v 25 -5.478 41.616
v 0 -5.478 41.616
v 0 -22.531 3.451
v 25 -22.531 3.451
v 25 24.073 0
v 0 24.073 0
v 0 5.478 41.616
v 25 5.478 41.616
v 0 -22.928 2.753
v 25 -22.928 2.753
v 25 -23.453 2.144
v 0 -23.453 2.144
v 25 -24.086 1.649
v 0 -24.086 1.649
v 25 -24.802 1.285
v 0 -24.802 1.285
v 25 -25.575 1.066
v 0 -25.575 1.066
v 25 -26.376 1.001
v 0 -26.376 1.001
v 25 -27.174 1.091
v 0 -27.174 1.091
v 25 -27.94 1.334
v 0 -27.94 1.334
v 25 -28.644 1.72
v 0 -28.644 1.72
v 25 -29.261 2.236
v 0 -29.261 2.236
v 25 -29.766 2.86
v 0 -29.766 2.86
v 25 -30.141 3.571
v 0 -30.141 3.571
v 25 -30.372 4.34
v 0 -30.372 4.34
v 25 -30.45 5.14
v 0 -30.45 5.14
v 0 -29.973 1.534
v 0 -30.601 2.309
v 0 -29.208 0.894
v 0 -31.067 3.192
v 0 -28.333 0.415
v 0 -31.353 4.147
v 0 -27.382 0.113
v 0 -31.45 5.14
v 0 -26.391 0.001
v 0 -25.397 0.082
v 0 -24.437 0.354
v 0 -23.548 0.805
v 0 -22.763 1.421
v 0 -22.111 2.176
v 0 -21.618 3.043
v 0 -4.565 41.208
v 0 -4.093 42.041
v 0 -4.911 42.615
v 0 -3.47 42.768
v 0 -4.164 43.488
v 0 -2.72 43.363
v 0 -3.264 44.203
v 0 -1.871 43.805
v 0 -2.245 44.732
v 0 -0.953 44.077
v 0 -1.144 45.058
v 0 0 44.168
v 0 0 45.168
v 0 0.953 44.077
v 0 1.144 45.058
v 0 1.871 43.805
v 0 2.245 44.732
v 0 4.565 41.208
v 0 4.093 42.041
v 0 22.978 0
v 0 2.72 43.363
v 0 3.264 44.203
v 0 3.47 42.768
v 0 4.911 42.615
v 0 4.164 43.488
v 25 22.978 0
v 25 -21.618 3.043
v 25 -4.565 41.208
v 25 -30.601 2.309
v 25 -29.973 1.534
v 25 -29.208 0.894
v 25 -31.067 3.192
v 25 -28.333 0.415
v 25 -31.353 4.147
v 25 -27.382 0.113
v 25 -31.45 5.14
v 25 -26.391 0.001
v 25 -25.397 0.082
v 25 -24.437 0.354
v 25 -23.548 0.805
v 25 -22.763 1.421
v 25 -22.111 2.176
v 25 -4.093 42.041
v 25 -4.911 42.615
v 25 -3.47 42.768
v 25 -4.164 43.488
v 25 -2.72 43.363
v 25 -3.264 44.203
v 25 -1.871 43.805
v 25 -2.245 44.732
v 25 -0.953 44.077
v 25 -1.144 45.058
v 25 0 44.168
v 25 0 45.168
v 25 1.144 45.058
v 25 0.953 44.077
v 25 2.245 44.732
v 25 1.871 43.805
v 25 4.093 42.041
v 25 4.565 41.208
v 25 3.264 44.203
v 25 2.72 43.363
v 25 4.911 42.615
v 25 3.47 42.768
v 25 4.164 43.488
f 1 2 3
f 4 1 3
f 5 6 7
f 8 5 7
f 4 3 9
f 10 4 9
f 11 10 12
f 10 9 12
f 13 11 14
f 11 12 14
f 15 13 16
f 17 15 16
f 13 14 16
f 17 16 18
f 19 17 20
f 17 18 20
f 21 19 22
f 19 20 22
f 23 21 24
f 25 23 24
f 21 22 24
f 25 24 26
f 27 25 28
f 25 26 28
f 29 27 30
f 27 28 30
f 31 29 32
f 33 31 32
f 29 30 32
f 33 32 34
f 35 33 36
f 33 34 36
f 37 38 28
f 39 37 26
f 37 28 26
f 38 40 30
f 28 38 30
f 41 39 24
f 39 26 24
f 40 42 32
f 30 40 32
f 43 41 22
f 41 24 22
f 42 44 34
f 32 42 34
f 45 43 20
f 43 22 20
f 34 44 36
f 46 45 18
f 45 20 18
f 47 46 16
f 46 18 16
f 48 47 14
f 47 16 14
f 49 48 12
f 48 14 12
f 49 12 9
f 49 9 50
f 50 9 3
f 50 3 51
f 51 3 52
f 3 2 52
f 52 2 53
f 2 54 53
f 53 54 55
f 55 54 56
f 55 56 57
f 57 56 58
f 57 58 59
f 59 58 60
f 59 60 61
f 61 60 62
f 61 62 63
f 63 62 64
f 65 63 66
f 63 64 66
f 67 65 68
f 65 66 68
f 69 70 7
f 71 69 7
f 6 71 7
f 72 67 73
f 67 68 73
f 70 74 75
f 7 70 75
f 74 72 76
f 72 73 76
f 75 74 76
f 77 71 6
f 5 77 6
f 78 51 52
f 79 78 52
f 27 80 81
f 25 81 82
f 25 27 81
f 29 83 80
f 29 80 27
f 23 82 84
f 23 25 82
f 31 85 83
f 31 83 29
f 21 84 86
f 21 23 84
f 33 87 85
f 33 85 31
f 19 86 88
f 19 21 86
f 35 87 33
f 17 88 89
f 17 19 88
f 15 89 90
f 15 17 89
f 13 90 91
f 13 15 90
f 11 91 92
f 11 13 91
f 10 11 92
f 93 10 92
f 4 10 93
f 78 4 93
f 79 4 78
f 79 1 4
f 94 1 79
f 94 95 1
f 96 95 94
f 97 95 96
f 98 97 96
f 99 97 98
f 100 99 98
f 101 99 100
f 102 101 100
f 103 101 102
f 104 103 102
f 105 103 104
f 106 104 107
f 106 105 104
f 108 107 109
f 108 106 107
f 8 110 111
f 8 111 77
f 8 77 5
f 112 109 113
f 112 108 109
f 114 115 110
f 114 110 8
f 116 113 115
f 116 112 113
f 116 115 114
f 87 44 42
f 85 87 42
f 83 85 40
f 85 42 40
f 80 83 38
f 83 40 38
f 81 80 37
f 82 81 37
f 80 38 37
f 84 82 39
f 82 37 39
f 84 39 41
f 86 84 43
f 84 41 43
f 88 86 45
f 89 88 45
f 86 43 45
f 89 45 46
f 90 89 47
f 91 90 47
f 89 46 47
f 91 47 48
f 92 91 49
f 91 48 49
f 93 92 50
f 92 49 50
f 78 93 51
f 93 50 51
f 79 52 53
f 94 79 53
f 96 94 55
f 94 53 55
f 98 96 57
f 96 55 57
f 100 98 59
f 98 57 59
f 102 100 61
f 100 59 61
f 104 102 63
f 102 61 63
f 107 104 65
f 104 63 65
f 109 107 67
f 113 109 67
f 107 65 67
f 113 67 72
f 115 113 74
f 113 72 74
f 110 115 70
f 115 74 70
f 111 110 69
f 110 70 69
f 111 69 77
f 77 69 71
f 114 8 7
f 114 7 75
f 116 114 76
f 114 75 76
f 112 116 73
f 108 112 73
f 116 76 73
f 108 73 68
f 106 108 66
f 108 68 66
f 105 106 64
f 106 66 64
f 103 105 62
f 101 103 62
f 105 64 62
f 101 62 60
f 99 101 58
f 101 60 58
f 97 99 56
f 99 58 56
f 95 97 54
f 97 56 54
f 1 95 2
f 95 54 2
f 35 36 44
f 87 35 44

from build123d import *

# Parameters (mm, degrees)
F1_DEPTH = 25


with BuildPart() as f1:
    # F0 (on Right) → F1 (new body)
    with BuildSketch(Plane.YZ):
        with BuildLine():
            ThreePointArc((-31.450262, 5.139706), (-27.3825, 0.113026), (-21.617982, 3.042966))
            Line((-21.617982, 3.042966), (-4.565023, 41.208058))
            ThreePointArc((-4.565023, 41.208058), (0, 44.168311), (4.565023, 41.208058))
            Line((4.565023, 41.208058), (22.977643, 0))
            Line((22.977643, 0), (24.072928, 0))
            Line((24.072928, 0), (5.478027, 41.616008))
            ThreePointArc((5.478027, 41.616008), (0, 45.168311), (-5.478027, 41.616008))
            Line((-5.478027, 41.616008), (-22.530987, 3.450915))
            ThreePointArc((-22.530987, 3.450915), (-27.173938, 1.091035), (-30.450262, 5.139706))
            Line((-30.450262, 5.139706), (-31.450262, 5.139706))
        make_face()
    extrude(amount=F1_DEPTH)


solid = f1.part
